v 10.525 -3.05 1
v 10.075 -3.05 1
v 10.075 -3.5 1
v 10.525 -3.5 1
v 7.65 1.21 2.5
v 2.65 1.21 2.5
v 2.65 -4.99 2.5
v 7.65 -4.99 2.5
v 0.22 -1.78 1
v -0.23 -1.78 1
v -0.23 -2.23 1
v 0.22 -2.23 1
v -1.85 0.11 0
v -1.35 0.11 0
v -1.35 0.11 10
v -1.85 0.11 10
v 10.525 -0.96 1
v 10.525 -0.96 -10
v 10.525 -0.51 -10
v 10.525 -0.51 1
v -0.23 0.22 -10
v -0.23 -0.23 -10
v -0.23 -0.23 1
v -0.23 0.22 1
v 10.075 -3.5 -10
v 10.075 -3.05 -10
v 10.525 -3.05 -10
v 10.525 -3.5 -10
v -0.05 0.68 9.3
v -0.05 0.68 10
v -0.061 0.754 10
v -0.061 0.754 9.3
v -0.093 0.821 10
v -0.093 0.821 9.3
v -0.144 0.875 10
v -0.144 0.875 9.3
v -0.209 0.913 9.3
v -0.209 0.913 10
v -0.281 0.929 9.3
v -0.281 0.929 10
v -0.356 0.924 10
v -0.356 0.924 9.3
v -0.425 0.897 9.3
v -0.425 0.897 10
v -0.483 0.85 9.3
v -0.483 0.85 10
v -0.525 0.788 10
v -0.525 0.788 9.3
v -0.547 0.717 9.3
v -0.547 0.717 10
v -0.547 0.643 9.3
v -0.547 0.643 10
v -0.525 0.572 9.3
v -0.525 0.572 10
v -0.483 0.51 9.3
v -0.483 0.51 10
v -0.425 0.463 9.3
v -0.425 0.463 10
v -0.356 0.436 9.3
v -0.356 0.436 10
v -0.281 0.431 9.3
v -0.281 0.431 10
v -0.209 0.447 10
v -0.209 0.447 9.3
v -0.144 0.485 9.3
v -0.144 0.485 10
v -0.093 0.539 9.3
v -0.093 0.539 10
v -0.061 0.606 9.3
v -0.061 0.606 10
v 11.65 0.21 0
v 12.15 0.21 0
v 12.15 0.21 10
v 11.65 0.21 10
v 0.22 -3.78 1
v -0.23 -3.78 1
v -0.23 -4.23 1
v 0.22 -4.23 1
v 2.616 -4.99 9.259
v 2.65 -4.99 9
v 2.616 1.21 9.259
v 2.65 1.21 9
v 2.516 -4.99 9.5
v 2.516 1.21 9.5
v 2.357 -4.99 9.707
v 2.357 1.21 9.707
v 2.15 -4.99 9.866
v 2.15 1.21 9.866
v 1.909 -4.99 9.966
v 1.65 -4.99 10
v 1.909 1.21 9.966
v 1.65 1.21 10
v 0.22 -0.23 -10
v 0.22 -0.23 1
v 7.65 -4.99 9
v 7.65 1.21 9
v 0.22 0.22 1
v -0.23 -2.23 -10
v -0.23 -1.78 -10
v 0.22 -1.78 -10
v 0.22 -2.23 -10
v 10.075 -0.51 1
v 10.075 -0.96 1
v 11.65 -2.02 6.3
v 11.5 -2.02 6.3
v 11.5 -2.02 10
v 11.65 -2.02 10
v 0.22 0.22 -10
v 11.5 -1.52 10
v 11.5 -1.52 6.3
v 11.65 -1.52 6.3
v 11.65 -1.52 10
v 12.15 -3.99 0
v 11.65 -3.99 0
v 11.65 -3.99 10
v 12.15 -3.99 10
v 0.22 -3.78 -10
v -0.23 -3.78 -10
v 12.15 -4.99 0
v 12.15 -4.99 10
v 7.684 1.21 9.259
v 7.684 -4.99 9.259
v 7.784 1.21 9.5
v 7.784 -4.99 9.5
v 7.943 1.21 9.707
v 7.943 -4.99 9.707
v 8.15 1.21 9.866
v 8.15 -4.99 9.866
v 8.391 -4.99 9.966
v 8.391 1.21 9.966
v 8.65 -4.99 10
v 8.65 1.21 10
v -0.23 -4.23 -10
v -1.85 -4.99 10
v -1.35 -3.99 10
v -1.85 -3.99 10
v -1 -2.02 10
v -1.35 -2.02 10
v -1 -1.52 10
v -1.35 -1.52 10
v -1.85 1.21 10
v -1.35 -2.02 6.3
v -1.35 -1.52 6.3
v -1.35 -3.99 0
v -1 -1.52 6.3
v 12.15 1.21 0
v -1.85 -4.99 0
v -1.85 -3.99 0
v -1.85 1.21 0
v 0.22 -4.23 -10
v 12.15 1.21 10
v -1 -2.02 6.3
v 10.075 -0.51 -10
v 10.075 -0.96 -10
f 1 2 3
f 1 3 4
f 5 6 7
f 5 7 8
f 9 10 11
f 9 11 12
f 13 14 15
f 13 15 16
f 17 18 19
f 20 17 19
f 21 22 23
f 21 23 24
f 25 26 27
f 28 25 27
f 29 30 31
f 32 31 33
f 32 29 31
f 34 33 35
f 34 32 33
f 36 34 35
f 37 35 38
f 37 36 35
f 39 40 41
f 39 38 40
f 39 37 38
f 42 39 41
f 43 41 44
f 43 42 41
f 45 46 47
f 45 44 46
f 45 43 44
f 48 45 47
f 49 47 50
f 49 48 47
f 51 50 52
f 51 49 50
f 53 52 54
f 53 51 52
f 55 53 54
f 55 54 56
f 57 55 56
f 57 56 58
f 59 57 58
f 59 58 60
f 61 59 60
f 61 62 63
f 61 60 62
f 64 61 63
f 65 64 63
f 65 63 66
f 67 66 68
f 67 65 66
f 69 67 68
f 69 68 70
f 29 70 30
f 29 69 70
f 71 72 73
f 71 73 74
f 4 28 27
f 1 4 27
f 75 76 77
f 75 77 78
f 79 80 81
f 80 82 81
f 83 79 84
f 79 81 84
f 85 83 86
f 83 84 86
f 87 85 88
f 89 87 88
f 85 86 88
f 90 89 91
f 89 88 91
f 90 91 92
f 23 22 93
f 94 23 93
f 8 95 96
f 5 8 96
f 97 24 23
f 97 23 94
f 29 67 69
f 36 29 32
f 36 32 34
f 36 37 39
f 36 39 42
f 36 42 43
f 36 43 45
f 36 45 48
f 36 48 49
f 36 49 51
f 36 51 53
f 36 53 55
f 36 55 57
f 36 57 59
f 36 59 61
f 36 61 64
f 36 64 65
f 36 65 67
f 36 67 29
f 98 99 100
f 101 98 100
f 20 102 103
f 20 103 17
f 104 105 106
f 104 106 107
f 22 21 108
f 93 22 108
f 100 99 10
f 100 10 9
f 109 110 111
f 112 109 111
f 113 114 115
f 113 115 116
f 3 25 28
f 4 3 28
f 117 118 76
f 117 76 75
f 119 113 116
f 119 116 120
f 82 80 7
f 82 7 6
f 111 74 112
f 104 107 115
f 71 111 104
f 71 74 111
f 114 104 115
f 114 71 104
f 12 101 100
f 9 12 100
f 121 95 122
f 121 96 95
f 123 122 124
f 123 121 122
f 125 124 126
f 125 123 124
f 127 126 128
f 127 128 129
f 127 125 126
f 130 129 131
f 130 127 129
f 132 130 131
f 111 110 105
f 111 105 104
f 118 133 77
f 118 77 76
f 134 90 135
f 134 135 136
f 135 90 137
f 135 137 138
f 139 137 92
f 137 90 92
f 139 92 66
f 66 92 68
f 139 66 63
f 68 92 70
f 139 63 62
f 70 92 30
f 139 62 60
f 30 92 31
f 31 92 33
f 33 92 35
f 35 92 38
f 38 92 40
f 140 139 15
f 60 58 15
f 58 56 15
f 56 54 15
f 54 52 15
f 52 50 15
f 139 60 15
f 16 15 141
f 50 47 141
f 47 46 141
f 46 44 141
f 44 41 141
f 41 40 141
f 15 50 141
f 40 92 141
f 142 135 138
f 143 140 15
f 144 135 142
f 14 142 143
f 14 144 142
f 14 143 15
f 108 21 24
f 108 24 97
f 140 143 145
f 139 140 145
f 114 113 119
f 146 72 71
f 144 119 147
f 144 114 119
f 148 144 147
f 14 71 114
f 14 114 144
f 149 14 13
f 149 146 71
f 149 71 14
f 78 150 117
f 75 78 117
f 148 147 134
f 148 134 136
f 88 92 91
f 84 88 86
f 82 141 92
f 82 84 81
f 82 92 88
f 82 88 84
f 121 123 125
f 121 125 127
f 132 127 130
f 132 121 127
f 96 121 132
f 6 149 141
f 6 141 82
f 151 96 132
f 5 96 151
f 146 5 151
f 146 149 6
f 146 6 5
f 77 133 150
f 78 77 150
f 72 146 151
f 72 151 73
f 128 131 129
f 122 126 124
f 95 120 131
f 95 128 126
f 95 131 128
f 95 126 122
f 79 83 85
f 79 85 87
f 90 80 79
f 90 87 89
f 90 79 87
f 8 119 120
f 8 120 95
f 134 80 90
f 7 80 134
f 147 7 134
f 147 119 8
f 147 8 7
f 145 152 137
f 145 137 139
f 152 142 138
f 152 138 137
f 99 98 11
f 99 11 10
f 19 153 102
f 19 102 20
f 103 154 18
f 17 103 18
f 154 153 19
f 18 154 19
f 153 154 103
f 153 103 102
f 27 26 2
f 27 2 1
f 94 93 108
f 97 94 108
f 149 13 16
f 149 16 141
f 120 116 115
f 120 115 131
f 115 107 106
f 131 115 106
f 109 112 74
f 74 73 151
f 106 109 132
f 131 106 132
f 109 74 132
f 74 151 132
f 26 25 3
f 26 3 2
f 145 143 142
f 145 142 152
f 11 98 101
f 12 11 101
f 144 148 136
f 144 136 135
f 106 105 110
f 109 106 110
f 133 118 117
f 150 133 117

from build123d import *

# Parameters (mm, degrees)
BOX_W             = 0.45
BOX_H             = 0.45
BOX_DEPTH         = 11
BOX001_W          = 0.45
BOX001_H          = 0.45
BOX001_DEPTH      = 11
BOX002_W          = 0.45
BOX002_H          = 0.45
BOX002_DEPTH      = 11
BOX003_W          = 0.45
BOX003_H          = 0.45
BOX003_DEPTH      = 11
BOX004_W          = 0.45
BOX004_H          = 0.45
BOX004_DEPTH      = 11
CYLINDER002_R     = 0.25
CYLINDER002_DEPTH = 1
BOX006_W          = 0.5
BOX006_H          = 0.5
BOX006_DEPTH      = 4
BOX007_W          = 0.5
BOX007_H          = 0.5
BOX007_DEPTH      = 4
BOX005_W          = 5
BOX005_H          = 8
BOX005_DEPTH      = 7.5
PAD_DEPTH         = 10
FILLET_R          = 1
FILLET001_R       = 1


with BuildPart() as pin001:
    # Box → Box (new body)
    with BuildSketch(Plane(origin=(-0.23, -0.23, -10), x_dir=(1, 0, 0), z_dir=(0, 0, 1))):
        with Locations((0.225, 0.225)):
            Rectangle(BOX_W, BOX_H)
    extrude(amount=BOX_DEPTH)


with BuildPart() as pin003:
    # Box001 → Box001 (new body)
    with BuildSketch(Plane(origin=(-0.23, -4.23, -10), x_dir=(1, 0, 0), z_dir=(0, 0, 1))):
        with Locations((0.225, 0.225)):
            Rectangle(BOX001_W, BOX001_H)
    extrude(amount=BOX001_DEPTH)


with BuildPart() as pin005:
    # Box002 → Box002 (new body)
    with BuildSketch(Plane(origin=(10.075, -0.96, -10), x_dir=(1, 0, 0), z_dir=(0, 0, 1))):
        with Locations((0.225, 0.225)):
            Rectangle(BOX002_W, BOX002_H)
    extrude(amount=BOX002_DEPTH)


with BuildPart() as pin002:
    # Box003 → Box003 (new body)
    with BuildSketch(Plane(origin=(-0.23, -2.23, -10), x_dir=(1, 0, 0), z_dir=(0, 0, 1))):
        with Locations((0.225, 0.225)):
            Rectangle(BOX003_W, BOX003_H)
    extrude(amount=BOX003_DEPTH)


with BuildPart() as pin004:
    # Box004 → Box004 (new body)
    with BuildSketch(Plane(origin=(10.075, -3.5, -10), x_dir=(1, 0, 0), z_dir=(0, 0, 1))):
        with Locations((0.225, 0.225)):
            Rectangle(BOX004_W, BOX004_H)
    extrude(amount=BOX004_DEPTH)


with BuildPart() as vcc_marking:
    # Cylinder002 → Cylinder002 (new body)
    with BuildSketch(Plane(origin=(-0.3, 1.2, 10), x_dir=(1, 0, 0), z_dir=(0, 0, 1))):
        Circle(CYLINDER002_R)
    extrude(amount=CYLINDER002_DEPTH)


with BuildPart() as kub006:
    # Box006 → Box006 (new body)
    with BuildSketch(Plane(origin=(-1.5, -1.5, 7), x_dir=(1, 0, 0), z_dir=(0, 0, 1))):
        with Locations((0.25, 0.25)):
            Rectangle(BOX006_W, BOX006_H)
    extrude(amount=BOX006_DEPTH)


with BuildPart() as kub007:
    # Box007 → Box007 (new body)
    with BuildSketch(Plane(origin=(11.5, -1.5, 7), x_dir=(1, 0, 0), z_dir=(0, 0, 1))):
        with Locations((0.25, 0.25)):
            Rectangle(BOX007_W, BOX007_H)
    extrude(amount=BOX007_DEPTH)


with BuildPart() as kub005:
    # Box005 → Box005 (new body)
    with BuildSketch(Plane(origin=(2.65, -5, 3.2), x_dir=(1, 0, 0), z_dir=(0, 0, 1))):
        with Locations((2.5, 4)):
            Rectangle(BOX005_W, BOX005_H)
    extrude(amount=BOX005_DEPTH)


with BuildPart() as fillet001:
    # Sketch → Pad (new body)
    with BuildSketch(Plane.XY):
        Polygon((-1.85, 1.73), (12.15, 1.73), (12.15, 0.73), (11.65, 0.73), (11.65, -3.47), (12.15, -3.47), (12.15, -4.47), (-1.85, -4.47), (-1.85, -3.47), (-1.35, -3.47), (-1.35, 0.63), (-1.85, 0.63), align=None)
    extrude(amount=PAD_DEPTH)


with BuildPart() as fillet001_1:
    # Body placement: moved
    add(fillet001.part.moved(Location((0, 0, 0.7))))

    # Cut: cut Kub005
    add(kub005.part, mode=Mode.SUBTRACT)

    # Cut001: cut Kub007
    add(kub007.part, mode=Mode.SUBTRACT)

    # Cut002: cut Kub006
    add(kub006.part, mode=Mode.SUBTRACT)

    # Cut003: cut VCC marking
    add(vcc_marking.part, mode=Mode.SUBTRACT)


with BuildPart() as fillet001_2:
    # Cut003 placement: moved
    add(fillet001_1.part.moved(Location((0, -0.52, -0.7))))

    # Fillet
    fillet_edges = [fillet001_2.edges().sort_by_distance(p)[0] for p in [
        (2.65, -1.89, 10),
    ]]
    fillet(fillet_edges, radius=FILLET_R)

    # Fillet001
    fillet001_edges = [fillet001_2.edges().sort_by_distance(p)[0] for p in [
        (7.65, -1.89, 10),
    ]]
    fillet(fillet001_edges, radius=FILLET001_R)


solid = Compound([pin001.part, pin003.part, pin005.part, pin002.part, pin004.part, fillet001_2.part])
